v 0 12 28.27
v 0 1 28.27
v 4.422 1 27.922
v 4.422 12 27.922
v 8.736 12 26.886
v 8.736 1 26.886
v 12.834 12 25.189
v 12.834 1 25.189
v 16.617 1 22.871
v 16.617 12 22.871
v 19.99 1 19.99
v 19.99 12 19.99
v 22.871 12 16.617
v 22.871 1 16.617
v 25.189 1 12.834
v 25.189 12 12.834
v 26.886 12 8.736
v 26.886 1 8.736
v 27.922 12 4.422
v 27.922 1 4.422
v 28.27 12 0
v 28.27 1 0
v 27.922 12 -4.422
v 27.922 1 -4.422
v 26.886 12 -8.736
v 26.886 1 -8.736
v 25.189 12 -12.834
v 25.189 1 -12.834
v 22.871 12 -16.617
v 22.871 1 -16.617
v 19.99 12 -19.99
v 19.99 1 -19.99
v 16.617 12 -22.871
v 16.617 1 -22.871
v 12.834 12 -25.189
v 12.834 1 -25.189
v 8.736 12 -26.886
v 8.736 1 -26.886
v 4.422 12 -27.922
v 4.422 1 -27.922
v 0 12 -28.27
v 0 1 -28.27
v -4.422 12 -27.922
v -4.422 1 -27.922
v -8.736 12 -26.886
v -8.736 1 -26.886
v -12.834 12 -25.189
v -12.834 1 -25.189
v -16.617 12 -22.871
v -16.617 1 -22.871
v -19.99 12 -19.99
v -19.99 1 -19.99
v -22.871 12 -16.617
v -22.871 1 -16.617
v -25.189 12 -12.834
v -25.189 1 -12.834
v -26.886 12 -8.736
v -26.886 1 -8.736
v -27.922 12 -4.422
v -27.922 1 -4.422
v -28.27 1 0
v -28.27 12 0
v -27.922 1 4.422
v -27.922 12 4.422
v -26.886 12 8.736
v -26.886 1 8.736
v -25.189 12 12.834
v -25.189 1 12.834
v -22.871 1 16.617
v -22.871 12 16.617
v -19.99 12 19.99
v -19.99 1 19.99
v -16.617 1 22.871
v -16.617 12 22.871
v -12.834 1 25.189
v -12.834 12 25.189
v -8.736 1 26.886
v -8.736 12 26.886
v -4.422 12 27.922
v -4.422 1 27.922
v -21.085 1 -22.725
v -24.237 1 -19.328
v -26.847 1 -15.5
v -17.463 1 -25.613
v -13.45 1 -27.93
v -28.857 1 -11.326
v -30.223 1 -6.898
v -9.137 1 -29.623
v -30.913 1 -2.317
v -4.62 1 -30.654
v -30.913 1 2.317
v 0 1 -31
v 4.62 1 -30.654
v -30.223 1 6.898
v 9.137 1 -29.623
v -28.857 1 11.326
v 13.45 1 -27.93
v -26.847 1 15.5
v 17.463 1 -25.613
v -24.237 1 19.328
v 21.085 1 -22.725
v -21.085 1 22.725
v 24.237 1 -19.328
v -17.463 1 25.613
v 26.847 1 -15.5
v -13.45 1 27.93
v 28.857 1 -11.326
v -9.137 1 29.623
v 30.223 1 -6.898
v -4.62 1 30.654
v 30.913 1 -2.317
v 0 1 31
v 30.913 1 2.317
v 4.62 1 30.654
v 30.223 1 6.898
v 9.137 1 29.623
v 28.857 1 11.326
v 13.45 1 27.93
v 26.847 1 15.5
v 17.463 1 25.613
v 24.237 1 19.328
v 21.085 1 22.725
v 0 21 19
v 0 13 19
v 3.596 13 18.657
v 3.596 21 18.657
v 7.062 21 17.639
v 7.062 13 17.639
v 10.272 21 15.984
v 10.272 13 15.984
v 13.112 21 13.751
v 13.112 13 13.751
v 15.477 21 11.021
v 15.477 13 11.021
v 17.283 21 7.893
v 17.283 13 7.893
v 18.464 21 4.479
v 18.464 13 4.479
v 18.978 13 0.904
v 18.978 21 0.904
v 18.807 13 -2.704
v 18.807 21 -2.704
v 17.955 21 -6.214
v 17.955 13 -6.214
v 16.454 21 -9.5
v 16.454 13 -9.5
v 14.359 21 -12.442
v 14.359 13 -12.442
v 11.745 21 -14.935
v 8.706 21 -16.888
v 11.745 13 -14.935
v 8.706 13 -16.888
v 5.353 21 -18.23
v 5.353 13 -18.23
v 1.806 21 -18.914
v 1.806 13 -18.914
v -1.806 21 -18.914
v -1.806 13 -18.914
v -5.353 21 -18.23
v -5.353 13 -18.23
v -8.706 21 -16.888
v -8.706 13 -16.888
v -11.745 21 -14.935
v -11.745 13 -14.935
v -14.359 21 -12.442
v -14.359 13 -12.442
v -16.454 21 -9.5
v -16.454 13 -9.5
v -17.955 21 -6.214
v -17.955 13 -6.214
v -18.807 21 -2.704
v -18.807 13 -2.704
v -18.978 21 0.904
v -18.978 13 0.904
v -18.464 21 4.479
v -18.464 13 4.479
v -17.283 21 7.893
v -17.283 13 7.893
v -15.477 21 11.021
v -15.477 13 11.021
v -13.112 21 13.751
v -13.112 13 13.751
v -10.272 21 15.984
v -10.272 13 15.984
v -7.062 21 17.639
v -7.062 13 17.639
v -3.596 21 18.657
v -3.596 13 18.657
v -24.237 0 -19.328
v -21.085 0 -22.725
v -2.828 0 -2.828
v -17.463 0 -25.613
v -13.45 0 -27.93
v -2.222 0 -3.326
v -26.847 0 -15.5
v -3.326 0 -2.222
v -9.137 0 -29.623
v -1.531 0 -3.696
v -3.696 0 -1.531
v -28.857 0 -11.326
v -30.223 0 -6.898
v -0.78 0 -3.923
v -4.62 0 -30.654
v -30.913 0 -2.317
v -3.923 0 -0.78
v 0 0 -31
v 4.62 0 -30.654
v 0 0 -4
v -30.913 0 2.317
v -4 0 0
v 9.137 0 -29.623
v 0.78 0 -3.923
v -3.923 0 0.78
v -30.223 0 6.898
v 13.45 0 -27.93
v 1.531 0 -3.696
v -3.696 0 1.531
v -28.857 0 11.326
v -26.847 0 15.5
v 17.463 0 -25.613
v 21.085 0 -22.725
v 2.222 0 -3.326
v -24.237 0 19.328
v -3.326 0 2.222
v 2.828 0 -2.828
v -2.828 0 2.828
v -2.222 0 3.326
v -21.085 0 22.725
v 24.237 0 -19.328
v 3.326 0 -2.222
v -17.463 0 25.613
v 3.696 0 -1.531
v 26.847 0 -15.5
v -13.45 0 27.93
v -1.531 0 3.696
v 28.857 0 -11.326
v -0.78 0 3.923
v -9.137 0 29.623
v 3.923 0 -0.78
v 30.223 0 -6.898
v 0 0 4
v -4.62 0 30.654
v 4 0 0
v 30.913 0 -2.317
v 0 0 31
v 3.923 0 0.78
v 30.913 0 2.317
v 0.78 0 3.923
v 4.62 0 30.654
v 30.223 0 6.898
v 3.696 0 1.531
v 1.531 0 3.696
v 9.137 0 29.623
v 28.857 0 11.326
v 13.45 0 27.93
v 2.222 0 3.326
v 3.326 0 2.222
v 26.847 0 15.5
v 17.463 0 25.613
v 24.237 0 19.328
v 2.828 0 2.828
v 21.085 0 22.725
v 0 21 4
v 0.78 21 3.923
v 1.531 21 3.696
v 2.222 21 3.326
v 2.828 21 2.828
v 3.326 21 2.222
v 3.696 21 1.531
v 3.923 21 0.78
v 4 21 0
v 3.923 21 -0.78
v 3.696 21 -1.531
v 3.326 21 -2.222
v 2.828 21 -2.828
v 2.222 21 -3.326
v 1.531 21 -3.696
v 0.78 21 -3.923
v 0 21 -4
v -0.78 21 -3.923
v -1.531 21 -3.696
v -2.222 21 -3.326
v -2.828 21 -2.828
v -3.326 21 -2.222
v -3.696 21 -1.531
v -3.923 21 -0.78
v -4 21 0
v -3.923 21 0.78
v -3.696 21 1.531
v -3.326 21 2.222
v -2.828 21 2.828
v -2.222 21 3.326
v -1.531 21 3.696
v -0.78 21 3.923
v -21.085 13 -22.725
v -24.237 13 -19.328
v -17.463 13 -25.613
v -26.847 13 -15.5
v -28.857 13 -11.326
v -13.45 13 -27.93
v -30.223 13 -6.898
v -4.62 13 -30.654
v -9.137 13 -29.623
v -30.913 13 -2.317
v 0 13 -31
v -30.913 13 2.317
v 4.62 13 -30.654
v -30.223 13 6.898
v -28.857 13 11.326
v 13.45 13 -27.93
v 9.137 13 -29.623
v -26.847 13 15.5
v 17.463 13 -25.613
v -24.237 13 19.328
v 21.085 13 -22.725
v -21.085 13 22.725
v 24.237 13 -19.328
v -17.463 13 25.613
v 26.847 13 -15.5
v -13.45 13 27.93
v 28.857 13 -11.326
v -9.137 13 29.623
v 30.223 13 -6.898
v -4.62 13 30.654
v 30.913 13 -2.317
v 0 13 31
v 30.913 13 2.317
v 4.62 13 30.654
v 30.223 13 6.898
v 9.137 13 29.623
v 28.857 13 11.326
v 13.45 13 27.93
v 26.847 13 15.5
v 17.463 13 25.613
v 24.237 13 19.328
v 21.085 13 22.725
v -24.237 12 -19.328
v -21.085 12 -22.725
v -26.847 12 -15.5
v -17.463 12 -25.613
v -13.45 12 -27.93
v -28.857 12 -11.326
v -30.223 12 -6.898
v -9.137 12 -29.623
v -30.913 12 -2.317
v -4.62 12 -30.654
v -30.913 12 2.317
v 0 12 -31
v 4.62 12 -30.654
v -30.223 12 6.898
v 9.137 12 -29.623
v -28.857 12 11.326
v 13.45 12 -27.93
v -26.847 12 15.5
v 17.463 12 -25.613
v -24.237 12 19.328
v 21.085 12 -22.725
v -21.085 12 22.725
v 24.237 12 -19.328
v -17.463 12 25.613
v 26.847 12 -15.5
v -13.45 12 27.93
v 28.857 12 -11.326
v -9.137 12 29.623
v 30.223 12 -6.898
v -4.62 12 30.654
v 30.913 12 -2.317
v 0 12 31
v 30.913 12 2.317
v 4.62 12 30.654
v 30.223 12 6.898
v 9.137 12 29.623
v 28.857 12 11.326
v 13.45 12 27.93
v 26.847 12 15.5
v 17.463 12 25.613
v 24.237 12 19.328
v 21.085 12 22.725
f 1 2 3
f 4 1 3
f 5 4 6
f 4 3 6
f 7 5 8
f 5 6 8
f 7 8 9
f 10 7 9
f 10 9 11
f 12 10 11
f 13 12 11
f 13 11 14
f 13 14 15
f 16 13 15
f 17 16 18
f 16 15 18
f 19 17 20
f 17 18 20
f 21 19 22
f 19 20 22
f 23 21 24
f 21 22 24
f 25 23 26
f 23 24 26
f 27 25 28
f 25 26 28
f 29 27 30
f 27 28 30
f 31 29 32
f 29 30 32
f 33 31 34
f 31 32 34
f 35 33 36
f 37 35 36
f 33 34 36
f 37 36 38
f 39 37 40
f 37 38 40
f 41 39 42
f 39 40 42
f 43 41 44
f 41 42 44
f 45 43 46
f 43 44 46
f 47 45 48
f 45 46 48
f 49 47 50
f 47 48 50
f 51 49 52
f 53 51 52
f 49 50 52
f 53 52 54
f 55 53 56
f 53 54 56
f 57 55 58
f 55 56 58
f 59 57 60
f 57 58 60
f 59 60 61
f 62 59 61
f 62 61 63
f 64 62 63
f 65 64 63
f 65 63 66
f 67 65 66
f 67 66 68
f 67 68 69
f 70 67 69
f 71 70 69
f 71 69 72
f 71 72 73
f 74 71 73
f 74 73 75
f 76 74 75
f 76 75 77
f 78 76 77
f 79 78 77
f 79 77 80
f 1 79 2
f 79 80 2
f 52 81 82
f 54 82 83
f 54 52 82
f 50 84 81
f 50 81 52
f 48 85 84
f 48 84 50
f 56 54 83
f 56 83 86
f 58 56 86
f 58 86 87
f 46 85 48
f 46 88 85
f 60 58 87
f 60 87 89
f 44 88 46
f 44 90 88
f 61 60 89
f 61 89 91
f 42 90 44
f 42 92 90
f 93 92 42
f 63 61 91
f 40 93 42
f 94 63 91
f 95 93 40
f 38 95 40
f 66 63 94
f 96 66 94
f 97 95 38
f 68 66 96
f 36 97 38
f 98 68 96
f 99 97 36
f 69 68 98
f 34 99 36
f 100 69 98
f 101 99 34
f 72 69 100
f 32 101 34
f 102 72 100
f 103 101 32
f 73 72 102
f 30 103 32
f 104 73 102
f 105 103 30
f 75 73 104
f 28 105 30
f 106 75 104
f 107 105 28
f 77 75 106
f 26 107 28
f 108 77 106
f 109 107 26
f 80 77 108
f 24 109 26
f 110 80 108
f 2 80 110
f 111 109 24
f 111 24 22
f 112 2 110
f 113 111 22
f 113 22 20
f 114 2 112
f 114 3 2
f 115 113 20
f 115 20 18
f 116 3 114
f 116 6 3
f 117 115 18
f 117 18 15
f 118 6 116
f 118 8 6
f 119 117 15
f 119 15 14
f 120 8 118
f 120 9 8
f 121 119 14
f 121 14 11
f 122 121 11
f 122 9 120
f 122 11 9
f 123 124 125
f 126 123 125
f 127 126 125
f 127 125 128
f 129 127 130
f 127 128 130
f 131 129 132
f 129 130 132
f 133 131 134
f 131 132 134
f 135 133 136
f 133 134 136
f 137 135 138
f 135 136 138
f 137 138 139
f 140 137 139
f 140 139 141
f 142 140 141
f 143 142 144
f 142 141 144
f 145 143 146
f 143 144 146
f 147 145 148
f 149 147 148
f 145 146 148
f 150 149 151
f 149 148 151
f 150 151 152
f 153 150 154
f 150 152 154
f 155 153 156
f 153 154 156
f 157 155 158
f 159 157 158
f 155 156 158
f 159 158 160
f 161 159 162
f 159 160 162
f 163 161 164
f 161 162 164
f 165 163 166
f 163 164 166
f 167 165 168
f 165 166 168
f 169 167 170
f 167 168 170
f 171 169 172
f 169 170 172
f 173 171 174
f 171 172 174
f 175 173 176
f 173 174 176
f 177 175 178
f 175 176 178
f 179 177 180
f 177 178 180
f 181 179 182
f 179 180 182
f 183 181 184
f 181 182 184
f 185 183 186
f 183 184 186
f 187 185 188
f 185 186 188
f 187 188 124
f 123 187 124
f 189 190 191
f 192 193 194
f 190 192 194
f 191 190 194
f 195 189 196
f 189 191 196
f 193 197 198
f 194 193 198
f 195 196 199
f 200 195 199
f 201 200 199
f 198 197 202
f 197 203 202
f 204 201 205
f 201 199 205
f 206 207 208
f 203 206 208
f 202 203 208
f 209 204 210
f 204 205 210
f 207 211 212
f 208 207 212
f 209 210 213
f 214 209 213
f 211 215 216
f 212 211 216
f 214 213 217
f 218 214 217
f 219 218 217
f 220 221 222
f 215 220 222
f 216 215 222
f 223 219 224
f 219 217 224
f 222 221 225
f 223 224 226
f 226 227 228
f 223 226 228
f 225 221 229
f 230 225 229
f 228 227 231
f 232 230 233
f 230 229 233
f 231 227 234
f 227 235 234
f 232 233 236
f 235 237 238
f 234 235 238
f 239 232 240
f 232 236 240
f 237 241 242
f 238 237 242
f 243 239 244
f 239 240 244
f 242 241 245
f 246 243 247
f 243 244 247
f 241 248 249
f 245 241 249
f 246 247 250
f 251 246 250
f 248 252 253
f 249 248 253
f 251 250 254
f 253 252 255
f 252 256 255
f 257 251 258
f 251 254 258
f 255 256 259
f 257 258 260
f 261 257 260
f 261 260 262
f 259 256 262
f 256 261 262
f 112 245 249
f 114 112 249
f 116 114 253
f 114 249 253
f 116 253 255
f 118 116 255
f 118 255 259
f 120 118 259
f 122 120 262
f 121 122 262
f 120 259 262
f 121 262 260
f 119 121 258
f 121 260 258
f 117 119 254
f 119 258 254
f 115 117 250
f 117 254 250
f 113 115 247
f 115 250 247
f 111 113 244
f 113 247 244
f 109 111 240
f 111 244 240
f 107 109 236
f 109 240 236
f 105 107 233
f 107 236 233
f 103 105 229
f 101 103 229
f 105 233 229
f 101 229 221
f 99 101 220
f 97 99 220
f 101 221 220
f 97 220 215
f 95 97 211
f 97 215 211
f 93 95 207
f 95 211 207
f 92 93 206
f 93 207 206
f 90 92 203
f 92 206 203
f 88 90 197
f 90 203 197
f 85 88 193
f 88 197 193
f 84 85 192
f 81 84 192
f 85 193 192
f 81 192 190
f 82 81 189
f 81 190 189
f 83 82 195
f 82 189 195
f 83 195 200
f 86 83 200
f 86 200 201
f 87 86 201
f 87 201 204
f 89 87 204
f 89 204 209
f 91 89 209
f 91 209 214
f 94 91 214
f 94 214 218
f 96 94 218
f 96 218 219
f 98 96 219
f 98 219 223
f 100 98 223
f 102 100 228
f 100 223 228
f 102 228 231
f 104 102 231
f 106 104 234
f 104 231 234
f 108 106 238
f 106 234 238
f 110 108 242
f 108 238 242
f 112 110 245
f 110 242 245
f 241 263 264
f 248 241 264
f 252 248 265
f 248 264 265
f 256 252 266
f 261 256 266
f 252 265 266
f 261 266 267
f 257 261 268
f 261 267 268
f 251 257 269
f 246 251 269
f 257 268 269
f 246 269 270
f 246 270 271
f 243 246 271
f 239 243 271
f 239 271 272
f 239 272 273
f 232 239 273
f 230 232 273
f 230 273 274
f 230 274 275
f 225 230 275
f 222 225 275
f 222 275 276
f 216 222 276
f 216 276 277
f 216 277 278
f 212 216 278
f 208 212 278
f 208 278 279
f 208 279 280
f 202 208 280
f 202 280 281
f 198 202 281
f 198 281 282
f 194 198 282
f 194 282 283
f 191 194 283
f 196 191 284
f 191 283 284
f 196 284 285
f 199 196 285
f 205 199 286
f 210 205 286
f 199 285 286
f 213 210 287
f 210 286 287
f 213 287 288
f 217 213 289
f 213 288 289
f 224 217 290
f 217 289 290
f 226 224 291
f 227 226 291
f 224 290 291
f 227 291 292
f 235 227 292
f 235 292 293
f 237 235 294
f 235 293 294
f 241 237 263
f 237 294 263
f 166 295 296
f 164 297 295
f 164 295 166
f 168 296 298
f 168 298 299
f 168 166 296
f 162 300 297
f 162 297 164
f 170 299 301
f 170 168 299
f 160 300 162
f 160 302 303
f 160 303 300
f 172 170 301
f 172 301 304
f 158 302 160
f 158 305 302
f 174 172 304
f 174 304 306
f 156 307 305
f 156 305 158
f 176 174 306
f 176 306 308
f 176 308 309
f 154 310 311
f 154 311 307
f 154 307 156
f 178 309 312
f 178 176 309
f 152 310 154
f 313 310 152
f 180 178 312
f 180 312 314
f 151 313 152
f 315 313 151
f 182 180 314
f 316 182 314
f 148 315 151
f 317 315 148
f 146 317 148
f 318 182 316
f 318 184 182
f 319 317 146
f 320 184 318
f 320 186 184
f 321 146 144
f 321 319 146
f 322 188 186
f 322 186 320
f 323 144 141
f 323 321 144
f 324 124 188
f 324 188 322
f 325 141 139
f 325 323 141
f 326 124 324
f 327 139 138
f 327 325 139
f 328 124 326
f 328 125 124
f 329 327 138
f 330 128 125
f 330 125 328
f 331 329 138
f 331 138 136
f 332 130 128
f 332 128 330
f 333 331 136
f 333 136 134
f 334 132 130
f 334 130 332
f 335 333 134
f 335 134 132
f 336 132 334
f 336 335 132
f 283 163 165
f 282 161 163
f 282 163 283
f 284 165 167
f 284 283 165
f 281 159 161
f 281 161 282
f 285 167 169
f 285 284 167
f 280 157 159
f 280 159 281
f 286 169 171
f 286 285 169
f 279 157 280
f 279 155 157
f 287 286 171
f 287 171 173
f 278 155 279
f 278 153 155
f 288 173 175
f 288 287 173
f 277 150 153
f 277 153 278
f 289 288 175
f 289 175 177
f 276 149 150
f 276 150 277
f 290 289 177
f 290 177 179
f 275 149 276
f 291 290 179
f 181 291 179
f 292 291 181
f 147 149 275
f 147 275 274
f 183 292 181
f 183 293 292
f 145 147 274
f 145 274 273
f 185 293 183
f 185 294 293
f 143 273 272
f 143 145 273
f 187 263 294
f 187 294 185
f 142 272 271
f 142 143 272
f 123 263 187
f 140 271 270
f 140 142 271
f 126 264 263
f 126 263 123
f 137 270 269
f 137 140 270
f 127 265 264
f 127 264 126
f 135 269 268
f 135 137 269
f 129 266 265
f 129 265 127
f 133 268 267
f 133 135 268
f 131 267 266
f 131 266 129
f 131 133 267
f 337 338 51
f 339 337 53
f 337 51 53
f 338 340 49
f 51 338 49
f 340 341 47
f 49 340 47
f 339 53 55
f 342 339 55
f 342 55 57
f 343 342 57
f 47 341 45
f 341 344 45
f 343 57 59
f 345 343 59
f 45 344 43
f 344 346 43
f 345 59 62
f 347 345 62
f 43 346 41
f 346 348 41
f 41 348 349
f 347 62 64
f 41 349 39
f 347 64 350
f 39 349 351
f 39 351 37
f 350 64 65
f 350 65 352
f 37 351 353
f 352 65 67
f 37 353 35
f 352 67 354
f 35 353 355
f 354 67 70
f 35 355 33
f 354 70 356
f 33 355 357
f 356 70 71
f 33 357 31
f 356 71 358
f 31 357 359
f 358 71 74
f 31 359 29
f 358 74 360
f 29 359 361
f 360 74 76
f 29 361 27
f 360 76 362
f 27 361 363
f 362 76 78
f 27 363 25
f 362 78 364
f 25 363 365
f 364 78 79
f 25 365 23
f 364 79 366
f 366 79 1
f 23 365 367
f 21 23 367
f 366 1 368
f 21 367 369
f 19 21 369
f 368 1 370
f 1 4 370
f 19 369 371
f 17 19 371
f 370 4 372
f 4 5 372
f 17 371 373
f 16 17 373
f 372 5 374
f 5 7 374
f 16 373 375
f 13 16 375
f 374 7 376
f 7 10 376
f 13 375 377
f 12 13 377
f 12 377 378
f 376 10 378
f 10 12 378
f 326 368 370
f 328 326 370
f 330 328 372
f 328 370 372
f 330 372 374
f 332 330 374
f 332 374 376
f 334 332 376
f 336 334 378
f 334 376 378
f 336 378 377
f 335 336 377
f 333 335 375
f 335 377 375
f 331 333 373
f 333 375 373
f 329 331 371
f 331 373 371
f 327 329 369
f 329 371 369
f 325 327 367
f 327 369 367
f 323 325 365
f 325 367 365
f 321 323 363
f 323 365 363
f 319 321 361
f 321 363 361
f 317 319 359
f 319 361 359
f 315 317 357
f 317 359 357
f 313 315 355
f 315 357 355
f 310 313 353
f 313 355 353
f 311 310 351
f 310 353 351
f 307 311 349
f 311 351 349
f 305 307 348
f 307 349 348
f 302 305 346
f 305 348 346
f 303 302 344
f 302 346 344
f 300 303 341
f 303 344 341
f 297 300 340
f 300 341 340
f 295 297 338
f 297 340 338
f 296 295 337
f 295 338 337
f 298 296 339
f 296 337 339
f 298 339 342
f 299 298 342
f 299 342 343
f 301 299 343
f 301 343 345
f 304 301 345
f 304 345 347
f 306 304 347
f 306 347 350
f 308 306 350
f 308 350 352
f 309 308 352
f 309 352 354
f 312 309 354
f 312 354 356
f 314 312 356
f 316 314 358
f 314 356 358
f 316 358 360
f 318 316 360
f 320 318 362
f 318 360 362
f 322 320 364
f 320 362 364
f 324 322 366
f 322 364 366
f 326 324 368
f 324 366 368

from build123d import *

# Parameters (mm, degrees)
SKETCH_1_R          = 31
EXTRUDE_1_DEPTH     = 1
SKETCH_2_R          = 28.27
EXTRUDE_2_DEPTH     = 11
SKETCH_3_R          = 31
EXTRUDE_3_DEPTH     = 1
SKETCH_4_R          = 19
EXTRUDE_4_DEPTH     = 8
SKETCH_5_R          = 4
CUT_EXTRUDE_1_DEPTH = 49.610698411


with BuildPart() as part:
    # Эскиз1 → Бобышка-Вытянуть1 (new body)
    with BuildSketch(Plane(origin=(0, 0, 0), x_dir=(1, 0, 0), z_dir=(0, 1, 0))):
        with Locations(Location((0, 0, 0), (0, 0, 270))):
            Circle(SKETCH_1_R)
    extrude(amount=EXTRUDE_1_DEPTH)

    # Эскиз2 → Бобышка-Вытянуть2 (add)
    with BuildSketch(Plane(origin=(0, 1, 0), x_dir=(1, 0, 0), z_dir=(0, 1, 0))):
        with Locations(Location((0, 0, 0), (0, 0, 270))):
            Circle(SKETCH_2_R)
    extrude(amount=EXTRUDE_2_DEPTH)

    # Эскиз3 → Бобышка-Вытянуть3 (add)
    with BuildSketch(Plane(origin=(0, 12, 0), x_dir=(1, 0, 0), z_dir=(0, 1, 0))):
        with Locations(Location((0, 0, 0), (0, 0, 270))):
            Circle(SKETCH_3_R)
    extrude(amount=EXTRUDE_3_DEPTH)

    # Эскиз4 → Бобышка-Вытянуть4 (add)
    with BuildSketch(Plane(origin=(0, 13, 0), x_dir=(1, 0, 0), z_dir=(0, 1, 0))):
        with Locations(Location((0, 0, 0), (0, 0, 270))):
            Circle(SKETCH_4_R)
    extrude(amount=EXTRUDE_4_DEPTH)

    # Эскиз5 → Вырез-Вытянуть1 (cut, through all)
    with BuildSketch(Plane(origin=(0, 21, 0), x_dir=(1, 0, 0), z_dir=(0, 1, 0))):
        with Locations(Location((0, 0, 0), (0, 0, 270))):
            Circle(SKETCH_5_R)
    extrude(amount=-CUT_EXTRUDE_1_DEPTH, mode=Mode.SUBTRACT)


solid = part.part
